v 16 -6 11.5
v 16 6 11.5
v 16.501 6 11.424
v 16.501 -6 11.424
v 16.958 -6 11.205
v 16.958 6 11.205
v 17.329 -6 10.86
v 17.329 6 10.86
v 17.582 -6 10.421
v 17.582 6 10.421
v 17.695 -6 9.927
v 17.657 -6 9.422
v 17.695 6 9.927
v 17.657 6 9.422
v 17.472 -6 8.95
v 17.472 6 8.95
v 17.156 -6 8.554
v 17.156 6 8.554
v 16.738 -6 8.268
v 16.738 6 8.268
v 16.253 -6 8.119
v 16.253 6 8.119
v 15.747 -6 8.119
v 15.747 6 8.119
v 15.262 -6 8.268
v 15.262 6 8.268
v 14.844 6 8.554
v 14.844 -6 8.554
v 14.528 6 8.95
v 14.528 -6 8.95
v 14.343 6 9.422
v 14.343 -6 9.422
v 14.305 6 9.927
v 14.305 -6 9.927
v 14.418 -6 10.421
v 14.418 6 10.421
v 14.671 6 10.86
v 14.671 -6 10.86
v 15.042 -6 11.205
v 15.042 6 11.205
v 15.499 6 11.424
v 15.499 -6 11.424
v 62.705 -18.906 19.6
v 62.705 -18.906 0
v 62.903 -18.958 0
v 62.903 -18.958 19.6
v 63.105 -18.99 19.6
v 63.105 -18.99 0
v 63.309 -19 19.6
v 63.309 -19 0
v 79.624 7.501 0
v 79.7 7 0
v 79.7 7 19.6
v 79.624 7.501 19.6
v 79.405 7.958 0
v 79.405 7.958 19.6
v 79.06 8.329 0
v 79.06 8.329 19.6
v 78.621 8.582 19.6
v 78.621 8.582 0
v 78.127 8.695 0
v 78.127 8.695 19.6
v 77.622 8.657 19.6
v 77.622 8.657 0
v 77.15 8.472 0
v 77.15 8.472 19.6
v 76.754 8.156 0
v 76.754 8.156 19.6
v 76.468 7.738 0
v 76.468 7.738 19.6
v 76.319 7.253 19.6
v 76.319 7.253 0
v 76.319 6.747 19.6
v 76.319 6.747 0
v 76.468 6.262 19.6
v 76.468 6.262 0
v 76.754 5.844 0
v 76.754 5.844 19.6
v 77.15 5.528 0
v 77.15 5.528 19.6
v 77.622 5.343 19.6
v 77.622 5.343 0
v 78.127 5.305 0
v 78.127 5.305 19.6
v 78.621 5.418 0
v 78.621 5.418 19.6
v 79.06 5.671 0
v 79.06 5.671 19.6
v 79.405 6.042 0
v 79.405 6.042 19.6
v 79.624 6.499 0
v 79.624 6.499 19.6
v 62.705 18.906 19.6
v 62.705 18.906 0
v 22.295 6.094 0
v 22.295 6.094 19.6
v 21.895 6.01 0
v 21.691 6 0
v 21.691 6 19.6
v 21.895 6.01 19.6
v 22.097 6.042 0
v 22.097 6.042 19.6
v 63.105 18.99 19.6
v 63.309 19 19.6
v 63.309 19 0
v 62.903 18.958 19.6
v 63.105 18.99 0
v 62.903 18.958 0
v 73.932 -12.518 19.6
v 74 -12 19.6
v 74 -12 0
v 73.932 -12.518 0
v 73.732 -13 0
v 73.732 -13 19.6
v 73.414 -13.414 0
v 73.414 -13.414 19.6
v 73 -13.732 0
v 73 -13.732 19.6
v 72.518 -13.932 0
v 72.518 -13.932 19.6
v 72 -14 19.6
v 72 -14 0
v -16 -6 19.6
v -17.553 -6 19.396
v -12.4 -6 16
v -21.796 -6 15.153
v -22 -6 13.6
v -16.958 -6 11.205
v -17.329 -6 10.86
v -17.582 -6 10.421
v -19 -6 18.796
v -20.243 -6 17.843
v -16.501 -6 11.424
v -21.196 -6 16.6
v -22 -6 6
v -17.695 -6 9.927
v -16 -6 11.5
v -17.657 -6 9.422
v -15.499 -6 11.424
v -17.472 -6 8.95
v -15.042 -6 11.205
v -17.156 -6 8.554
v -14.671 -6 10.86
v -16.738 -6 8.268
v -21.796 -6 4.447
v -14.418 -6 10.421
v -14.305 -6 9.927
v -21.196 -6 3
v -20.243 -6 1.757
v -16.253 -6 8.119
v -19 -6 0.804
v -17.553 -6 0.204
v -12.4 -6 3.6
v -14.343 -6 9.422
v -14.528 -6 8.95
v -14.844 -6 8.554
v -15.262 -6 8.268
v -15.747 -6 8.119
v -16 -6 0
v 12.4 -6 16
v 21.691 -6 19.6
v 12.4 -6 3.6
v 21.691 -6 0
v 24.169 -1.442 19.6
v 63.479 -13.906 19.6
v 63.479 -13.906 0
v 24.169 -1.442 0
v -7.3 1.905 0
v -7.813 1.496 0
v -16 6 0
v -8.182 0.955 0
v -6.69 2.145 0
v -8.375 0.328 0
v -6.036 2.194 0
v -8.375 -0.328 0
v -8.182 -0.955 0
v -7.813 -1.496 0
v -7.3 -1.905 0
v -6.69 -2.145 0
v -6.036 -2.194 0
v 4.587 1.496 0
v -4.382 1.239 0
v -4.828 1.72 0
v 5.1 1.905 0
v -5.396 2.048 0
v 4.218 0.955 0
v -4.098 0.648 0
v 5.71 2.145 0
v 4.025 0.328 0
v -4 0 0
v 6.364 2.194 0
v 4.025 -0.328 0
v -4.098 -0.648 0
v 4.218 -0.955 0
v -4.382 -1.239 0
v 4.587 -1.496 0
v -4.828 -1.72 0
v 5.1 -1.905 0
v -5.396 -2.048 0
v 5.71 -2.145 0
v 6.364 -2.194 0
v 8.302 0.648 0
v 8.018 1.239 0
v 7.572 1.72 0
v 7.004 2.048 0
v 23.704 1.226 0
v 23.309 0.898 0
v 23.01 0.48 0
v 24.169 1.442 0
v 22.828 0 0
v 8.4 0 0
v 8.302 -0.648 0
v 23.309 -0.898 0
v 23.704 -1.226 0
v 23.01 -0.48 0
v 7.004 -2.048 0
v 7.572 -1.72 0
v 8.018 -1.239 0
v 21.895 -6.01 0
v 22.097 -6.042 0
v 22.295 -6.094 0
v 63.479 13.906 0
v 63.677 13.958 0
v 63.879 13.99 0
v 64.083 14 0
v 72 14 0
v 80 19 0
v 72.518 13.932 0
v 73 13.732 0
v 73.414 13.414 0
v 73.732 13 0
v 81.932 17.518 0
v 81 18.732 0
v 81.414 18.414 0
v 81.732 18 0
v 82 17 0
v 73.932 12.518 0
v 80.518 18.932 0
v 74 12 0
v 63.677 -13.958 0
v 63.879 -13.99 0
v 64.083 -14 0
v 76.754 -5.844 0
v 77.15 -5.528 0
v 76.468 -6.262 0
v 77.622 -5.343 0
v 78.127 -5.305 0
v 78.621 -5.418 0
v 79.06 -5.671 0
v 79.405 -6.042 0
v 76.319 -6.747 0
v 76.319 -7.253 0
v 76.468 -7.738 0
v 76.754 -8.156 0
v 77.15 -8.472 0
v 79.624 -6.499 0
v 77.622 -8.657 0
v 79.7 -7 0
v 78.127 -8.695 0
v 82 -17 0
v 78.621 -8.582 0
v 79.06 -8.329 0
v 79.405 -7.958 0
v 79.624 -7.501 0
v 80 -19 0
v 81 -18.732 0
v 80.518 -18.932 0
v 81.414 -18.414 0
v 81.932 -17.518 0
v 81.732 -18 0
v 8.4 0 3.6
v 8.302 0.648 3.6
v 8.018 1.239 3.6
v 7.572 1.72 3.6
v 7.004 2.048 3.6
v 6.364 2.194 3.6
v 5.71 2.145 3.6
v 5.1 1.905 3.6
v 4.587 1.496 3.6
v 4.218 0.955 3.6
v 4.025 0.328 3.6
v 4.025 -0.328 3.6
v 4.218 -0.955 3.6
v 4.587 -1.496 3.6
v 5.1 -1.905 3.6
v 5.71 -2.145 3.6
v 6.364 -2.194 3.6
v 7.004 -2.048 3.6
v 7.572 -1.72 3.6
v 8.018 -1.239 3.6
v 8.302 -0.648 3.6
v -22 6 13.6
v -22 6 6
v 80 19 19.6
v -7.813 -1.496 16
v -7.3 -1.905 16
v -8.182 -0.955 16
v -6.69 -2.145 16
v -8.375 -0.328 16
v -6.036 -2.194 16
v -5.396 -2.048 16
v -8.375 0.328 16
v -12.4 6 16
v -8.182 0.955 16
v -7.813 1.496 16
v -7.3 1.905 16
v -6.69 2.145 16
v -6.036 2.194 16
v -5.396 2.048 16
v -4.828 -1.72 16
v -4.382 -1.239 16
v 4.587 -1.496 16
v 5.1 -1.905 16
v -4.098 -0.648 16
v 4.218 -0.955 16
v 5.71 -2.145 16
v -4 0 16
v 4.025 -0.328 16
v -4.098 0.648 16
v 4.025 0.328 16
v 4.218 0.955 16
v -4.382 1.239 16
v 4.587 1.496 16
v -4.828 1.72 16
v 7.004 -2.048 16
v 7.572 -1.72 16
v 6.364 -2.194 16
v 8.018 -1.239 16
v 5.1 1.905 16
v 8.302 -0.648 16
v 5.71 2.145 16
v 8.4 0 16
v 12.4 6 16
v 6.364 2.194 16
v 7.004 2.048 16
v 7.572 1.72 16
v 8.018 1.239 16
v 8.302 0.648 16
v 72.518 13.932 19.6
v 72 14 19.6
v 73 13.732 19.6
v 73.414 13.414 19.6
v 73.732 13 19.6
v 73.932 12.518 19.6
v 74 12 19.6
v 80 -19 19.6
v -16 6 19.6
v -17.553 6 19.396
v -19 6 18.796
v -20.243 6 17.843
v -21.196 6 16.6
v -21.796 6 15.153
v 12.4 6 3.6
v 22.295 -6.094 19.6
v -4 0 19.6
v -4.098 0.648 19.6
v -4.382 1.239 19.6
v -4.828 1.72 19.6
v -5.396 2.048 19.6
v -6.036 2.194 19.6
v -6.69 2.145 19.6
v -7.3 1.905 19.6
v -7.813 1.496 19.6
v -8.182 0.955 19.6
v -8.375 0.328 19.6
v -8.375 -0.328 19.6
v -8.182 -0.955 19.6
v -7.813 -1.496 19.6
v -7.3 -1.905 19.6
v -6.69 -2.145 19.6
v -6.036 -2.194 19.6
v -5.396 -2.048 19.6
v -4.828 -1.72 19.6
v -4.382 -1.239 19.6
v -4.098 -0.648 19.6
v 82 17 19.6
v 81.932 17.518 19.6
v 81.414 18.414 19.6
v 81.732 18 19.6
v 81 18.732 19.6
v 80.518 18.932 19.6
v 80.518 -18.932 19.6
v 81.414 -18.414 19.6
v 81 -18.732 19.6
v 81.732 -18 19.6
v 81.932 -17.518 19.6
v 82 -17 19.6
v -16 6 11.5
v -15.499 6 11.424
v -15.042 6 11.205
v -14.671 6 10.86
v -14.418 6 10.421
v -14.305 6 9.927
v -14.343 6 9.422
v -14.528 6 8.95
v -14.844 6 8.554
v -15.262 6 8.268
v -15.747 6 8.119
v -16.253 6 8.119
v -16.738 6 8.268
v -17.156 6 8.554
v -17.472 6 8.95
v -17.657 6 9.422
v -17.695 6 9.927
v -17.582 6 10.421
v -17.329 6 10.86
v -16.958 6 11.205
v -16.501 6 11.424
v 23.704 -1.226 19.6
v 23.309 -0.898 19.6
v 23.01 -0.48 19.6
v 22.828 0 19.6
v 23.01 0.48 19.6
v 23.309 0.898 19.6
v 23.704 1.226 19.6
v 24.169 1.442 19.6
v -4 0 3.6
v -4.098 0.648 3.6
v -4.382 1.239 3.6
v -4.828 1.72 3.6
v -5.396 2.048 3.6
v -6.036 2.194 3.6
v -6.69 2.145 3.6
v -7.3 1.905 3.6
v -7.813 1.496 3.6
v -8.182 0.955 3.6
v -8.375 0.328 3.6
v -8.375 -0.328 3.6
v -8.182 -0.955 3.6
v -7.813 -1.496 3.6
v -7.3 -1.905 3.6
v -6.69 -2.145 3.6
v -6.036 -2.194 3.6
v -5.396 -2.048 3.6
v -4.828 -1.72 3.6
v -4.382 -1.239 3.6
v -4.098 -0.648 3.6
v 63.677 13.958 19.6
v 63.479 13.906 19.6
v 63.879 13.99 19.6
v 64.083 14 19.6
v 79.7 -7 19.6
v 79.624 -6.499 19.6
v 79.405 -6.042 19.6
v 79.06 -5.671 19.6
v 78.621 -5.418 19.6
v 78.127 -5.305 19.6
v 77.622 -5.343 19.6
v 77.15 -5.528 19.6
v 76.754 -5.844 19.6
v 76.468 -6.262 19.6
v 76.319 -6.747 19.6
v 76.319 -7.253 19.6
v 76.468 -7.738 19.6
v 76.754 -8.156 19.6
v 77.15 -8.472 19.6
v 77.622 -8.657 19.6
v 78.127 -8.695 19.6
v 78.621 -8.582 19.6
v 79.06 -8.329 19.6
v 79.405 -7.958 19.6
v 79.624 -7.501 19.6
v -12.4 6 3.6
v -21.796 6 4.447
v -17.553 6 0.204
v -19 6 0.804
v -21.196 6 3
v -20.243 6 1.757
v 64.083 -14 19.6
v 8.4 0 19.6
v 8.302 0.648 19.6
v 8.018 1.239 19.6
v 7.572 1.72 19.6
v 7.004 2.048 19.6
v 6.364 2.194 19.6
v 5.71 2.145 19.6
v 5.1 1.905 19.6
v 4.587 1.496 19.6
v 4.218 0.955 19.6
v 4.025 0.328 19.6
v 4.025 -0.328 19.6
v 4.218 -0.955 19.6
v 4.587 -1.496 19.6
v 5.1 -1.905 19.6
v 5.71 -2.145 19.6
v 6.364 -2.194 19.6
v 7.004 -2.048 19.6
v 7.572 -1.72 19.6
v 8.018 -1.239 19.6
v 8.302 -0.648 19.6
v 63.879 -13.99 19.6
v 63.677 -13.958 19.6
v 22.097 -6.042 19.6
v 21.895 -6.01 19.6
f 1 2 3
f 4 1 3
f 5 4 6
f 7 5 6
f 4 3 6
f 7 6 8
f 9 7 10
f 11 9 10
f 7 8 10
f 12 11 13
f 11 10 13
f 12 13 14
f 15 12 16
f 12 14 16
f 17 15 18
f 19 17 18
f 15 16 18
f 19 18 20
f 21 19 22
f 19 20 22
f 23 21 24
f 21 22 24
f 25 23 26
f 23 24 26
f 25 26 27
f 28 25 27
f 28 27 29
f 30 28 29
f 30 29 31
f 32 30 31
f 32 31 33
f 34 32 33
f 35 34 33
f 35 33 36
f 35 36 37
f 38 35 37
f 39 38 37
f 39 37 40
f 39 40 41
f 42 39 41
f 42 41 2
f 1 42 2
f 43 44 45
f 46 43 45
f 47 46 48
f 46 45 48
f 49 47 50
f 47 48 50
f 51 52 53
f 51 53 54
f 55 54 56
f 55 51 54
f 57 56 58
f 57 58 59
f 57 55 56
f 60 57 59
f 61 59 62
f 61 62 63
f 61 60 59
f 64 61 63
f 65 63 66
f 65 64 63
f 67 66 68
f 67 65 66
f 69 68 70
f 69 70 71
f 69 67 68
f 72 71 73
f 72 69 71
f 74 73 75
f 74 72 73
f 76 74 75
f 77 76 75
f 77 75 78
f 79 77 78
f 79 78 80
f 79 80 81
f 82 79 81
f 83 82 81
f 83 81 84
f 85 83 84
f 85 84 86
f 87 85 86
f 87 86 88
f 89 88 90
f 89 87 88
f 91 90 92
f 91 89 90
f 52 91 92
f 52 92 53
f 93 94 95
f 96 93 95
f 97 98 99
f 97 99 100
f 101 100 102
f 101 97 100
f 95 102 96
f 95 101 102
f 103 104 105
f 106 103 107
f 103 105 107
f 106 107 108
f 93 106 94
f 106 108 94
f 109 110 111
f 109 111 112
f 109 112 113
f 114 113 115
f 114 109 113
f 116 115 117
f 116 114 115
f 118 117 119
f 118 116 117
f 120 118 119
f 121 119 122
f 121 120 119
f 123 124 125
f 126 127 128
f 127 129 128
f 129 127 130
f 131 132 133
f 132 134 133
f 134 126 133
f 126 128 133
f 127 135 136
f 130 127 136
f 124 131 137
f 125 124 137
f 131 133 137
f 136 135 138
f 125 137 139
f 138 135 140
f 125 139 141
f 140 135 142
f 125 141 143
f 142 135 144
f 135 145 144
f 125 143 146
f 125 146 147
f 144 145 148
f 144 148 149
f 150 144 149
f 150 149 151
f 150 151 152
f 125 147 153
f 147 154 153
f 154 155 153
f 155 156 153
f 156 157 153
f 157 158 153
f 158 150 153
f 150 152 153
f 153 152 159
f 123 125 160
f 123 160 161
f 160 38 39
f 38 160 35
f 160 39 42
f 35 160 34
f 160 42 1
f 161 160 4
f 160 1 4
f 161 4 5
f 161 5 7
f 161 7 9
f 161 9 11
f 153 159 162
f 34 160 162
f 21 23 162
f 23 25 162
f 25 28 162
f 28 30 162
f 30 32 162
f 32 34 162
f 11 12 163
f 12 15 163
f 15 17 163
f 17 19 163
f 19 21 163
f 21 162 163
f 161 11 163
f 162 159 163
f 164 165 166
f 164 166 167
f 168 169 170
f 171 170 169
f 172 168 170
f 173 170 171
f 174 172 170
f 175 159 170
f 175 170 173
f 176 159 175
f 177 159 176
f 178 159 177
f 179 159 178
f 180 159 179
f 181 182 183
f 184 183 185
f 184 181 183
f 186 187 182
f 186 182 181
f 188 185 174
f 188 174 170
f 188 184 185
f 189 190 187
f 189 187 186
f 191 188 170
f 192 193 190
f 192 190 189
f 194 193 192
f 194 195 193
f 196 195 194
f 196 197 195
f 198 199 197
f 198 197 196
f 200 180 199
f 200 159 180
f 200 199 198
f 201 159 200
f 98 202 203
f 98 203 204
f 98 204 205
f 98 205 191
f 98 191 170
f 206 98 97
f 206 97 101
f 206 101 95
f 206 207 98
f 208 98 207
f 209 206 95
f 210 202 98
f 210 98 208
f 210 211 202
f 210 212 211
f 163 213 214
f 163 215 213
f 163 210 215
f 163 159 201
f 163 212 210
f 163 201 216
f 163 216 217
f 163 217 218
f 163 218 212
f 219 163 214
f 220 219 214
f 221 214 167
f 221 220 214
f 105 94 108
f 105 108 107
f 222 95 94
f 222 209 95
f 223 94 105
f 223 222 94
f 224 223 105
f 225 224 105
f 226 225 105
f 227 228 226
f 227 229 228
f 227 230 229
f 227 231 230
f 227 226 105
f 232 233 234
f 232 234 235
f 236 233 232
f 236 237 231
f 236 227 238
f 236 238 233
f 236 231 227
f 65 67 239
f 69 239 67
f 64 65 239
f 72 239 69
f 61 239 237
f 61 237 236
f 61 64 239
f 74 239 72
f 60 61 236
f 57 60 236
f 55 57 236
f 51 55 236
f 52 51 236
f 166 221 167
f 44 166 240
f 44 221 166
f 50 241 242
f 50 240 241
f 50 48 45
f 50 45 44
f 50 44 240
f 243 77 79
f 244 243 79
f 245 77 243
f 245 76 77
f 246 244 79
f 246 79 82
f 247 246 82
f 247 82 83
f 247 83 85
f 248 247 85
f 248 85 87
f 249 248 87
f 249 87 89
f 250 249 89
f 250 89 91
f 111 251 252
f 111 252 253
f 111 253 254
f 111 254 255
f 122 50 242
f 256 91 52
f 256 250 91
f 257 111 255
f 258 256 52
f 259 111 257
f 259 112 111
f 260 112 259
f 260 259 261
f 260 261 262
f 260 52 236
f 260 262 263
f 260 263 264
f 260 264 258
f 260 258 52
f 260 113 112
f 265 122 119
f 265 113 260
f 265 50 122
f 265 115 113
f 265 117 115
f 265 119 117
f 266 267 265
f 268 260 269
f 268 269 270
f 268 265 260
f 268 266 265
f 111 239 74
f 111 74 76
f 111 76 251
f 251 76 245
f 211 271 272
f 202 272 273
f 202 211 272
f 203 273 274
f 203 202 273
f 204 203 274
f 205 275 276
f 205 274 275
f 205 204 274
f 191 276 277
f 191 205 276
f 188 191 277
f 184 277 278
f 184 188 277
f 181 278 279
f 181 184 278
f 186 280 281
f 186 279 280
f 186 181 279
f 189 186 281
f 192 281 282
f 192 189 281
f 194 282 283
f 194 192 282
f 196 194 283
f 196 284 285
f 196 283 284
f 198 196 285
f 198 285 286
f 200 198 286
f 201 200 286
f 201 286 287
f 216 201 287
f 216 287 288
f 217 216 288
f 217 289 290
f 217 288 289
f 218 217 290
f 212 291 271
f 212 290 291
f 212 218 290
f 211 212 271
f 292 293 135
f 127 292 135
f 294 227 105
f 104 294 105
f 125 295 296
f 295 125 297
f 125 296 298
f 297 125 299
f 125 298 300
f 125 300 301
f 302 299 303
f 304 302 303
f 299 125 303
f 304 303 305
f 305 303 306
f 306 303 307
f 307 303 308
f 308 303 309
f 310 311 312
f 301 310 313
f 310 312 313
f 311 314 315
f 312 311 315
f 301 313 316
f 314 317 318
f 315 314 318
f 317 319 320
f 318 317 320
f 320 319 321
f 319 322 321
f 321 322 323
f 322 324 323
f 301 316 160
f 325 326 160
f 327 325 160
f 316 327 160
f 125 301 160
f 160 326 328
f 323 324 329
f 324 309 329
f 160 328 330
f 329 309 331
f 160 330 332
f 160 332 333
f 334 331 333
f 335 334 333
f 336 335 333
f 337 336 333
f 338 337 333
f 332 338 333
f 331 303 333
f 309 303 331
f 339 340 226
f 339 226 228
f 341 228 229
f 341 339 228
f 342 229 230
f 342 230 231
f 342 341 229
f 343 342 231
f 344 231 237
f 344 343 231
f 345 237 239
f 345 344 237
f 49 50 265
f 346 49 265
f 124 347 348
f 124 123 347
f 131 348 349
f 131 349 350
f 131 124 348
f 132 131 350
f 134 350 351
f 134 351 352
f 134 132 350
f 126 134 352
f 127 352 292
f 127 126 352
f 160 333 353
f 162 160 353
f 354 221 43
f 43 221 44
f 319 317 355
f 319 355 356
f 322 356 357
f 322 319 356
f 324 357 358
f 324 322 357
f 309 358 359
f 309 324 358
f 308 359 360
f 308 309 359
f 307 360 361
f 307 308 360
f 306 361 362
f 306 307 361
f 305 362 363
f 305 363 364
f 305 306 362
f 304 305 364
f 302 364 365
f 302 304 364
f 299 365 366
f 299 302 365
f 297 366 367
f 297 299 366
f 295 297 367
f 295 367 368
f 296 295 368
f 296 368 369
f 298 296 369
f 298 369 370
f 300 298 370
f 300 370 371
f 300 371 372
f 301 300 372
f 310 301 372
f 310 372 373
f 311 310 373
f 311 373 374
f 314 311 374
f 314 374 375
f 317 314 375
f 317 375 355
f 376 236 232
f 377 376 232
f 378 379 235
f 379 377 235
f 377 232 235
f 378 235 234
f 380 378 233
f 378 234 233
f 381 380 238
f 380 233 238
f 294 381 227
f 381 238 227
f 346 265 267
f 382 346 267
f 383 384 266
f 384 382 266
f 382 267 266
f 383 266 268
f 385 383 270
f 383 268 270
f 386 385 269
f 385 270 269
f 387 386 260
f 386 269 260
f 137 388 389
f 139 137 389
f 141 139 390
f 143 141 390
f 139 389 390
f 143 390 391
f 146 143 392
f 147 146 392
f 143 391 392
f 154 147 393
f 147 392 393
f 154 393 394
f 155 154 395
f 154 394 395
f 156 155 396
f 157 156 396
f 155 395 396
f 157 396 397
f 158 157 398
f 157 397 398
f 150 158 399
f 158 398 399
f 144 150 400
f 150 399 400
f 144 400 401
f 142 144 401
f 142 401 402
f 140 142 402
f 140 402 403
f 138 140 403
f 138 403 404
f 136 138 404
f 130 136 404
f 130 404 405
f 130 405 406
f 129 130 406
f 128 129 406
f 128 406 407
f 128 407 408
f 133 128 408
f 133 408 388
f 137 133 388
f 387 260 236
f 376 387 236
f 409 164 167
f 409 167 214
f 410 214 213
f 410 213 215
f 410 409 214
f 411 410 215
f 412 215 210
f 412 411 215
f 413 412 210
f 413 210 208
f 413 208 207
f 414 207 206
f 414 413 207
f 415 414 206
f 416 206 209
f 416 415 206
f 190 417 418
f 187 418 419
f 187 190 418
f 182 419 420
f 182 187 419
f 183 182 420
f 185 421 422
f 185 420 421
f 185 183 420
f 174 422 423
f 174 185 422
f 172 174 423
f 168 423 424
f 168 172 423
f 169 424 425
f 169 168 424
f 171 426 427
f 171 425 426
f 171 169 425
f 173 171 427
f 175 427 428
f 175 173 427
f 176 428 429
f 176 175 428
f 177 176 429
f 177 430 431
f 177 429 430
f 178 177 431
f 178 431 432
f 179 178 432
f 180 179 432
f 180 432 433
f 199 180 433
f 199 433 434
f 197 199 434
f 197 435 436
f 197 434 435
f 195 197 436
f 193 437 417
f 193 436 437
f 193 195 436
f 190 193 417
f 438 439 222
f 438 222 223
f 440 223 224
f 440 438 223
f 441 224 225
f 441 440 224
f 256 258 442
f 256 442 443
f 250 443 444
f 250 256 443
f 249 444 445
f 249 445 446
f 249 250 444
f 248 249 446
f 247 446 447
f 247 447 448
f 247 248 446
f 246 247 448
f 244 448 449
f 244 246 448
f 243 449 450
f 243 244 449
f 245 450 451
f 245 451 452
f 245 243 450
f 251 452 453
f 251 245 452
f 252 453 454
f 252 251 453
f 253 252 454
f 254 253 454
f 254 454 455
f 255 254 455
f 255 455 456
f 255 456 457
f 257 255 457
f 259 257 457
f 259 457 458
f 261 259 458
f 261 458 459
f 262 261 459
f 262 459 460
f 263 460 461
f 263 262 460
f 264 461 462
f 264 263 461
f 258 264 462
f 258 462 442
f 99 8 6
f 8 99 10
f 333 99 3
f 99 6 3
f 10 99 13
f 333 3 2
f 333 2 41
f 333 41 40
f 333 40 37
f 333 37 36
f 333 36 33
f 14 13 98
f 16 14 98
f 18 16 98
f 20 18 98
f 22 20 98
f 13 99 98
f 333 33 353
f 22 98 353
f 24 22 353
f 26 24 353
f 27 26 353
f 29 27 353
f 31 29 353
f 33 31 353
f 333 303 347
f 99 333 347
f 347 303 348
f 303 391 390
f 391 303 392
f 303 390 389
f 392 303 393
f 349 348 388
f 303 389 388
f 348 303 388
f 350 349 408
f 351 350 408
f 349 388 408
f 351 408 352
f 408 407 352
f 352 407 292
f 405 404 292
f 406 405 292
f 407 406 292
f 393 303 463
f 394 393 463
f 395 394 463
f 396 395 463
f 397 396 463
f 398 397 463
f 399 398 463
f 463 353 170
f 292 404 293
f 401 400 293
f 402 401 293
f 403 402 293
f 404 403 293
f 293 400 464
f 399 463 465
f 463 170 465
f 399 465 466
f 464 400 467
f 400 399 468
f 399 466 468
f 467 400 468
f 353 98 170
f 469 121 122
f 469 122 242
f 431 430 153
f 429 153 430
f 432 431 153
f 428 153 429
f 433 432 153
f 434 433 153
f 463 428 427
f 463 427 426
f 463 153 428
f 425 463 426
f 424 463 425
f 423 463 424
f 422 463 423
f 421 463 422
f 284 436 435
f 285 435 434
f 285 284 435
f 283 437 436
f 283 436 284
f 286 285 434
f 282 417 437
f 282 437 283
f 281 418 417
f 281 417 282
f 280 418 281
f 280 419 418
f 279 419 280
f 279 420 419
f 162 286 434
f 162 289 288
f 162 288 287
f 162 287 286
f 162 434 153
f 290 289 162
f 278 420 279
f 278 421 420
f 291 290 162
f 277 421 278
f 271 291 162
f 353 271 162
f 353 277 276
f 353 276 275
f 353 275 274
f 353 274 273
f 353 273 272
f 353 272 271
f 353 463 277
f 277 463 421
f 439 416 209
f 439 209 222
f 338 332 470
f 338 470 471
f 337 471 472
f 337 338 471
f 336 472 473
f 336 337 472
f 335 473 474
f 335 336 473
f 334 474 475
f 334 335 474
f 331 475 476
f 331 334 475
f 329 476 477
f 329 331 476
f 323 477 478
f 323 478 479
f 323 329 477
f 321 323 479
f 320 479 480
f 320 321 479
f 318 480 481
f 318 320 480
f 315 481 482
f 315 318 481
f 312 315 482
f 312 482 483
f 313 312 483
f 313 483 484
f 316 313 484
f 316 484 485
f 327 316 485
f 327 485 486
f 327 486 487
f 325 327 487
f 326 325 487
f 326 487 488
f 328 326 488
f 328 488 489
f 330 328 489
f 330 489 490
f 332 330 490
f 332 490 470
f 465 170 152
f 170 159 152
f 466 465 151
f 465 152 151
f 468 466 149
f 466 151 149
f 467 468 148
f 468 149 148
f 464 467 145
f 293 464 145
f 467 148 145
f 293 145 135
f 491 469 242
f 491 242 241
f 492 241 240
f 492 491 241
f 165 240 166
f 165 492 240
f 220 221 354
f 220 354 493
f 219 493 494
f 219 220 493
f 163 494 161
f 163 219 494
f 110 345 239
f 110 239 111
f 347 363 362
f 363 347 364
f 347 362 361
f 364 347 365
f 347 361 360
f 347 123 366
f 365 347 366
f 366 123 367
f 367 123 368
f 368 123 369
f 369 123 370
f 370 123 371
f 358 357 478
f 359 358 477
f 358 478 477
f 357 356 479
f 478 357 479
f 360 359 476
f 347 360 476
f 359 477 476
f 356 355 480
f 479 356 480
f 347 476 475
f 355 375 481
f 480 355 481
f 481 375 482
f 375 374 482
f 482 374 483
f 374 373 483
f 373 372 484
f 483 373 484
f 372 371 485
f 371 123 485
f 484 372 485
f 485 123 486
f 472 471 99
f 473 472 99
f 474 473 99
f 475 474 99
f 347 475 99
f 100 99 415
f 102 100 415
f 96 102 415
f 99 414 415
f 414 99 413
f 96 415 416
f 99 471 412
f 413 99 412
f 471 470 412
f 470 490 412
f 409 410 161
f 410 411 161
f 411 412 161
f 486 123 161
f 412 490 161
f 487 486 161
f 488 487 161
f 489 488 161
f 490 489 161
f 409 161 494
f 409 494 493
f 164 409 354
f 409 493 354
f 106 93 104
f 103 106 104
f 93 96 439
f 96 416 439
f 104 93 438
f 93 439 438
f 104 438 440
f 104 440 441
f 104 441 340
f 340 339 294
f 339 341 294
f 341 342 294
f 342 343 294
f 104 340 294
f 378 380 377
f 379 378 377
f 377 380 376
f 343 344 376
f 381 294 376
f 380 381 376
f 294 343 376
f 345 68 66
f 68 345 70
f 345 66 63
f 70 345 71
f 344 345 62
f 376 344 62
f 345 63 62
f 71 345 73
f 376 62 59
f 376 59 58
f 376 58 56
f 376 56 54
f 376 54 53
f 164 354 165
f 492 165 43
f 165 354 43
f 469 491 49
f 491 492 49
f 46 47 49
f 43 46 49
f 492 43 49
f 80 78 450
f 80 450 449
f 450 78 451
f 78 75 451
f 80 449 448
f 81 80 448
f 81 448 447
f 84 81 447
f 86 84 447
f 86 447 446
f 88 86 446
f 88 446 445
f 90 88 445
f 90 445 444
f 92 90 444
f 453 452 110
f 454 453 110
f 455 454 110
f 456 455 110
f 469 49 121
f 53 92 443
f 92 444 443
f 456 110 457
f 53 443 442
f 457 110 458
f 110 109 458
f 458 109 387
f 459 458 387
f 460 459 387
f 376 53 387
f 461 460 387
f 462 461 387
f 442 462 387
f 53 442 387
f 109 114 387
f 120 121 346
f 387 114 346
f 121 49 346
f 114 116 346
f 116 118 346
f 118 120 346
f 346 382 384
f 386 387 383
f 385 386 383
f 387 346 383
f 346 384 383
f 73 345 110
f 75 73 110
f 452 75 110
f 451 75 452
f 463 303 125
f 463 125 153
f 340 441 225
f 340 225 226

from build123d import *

# Parameters (mm, degrees)
SKETCH_1_R          = 2.2
SKETCH_1_R_2        = 1.7
EXTRUDE_1_DEPTH     = 19.6
SKETCH_2_R          = 1.7
SKETCH_2_W          = 24.8
SKETCH_2_H          = 12.4
CUT_EXTRUDE_1_DEPTH = 88.938387522
CUT_EXTRUDE_2_DEPTH = 87.424302138
FILLET_1_R          = 2
FILLET_2_R          = 6


with BuildPart() as part:
    # 草图1 → 凸台-拉伸1 (new body)
    with BuildSketch(Plane.XY):
        Polygon((-22, -6), (22, -6), (63, -19), (82, -19), (82, 19), (63, 19), (22, 6), (-22, 6), align=None)
        with Locations((-6.2, 0)):
            Circle(SKETCH_1_R, mode=Mode.SUBTRACT)
        with Locations((6.2, 0)):
            Circle(SKETCH_1_R, mode=Mode.SUBTRACT)
        with Locations((78, 7)):
            Circle(SKETCH_1_R_2, mode=Mode.SUBTRACT)
        with Locations((78, -7)):
            Circle(SKETCH_1_R_2, mode=Mode.SUBTRACT)
    extrude(amount=EXTRUDE_1_DEPTH)

    # 草图2 → 切除-拉伸1 (cut, through all)
    with BuildSketch(Plane(origin=(0, 6, 0), x_dir=(1, 0, 0), z_dir=(0, 1, 0))):
        with Locations(Location((16, -9.8, 0), (0, 0, 270))):
            Circle(SKETCH_2_R)
        with Locations(Location((-16, -9.8, 0), (0, 0, 270))):
            Circle(SKETCH_2_R)
        with Locations((0, -9.8)):
            Rectangle(SKETCH_2_W, SKETCH_2_H)
    extrude(amount=-CUT_EXTRUDE_1_DEPTH, mode=Mode.SUBTRACT)

    # 草图3 → 切除-拉伸2 (cut, through all)
    with BuildSketch(Plane.XY.offset(19.6)):
        Polygon((74, 14), (74, -14), (63.773702437, -14), (22.773702437, -1), (22.773702437, 1), (63.773702437, 14), align=None)
    extrude(amount=-CUT_EXTRUDE_2_DEPTH, mode=Mode.SUBTRACT)

    # 圆角1
    # the kernel refuses this fillet: 2 mm, written as the material it adds along each edge
    with BuildSketch(Plane(origin=(74, 14, 19.6), x_dir=(-1, 0, 0), z_dir=(0, 0, -1))) as fillet_1_piece_1:
        with BuildLine():
            CenterArc((FILLET_1_R, -FILLET_1_R), FILLET_1_R, 90, 90)
            Line((0, -FILLET_1_R), (0, 0))
            Line((0, 0), (FILLET_1_R, 0))
        make_face()
    extrude(amount=19.6)
    with BuildSketch(Plane(origin=(63.773702437, 14, 19.6), x_dir=(1, 0, 0), z_dir=(0, 0, -1)), Plane(origin=(63.773702437, -14, 19.6), x_dir=(-0.9532306376993169, 0.30224386073393383, 0), z_dir=(0, 0, -1)), Plane(origin=(22, -6, 0), x_dir=(-1, 0, 0), z_dir=(0, 0, 1))) as fillet_1_piece_2:
        with BuildLine():
            CenterArc((FILLET_1_R * 0.154740487324, FILLET_1_R), FILLET_1_R, 252.407575438, 17.592424562)
            Line((-FILLET_1_R * 0.14750337341, FILLET_1_R * 0.0467693623007), (0, 0))
            Line((0, 0), (FILLET_1_R * 0.154740487324, 0))
        make_face()
    extrude(amount=19.6)
    with BuildSketch(Plane(origin=(74, -14, 19.6), x_dir=(-1, 0, 0), z_dir=(0, 0, -1))) as fillet_1_piece_3:
        with BuildLine():
            CenterArc((FILLET_1_R, FILLET_1_R), FILLET_1_R, 180, 90)
            Line((0, FILLET_1_R), (0, 0))
            Line((0, 0), (FILLET_1_R, 0))
        make_face()
    extrude(amount=19.6)
    with BuildSketch(Plane(origin=(22.773702437, 1, 19.6), x_dir=(0.9532306376993182, 0.30224386073392995, 0), z_dir=(0, 0, -1)), Plane(origin=(22.773702437, -1, 19.6), x_dir=(0, 1, 0), z_dir=(0, 0, -1))) as fillet_1_piece_4:
        with BuildLine():
            CenterArc((FILLET_1_R * 0.731990886225, FILLET_1_R), FILLET_1_R, 197.592424562, 72.407575438)
            Line((-FILLET_1_R * 0.221239751475, FILLET_1_R * 0.697756139266), (0, 0))
            Line((0, 0), (FILLET_1_R * 0.731990886225, 0))
        make_face()
    extrude(amount=19.6)
    with BuildSketch(Plane(origin=(22, 6, 0), x_dir=(-1, 0, 0), z_dir=(0, 0, 1))) as fillet_1_piece_5:
        with BuildLine():
            CenterArc((FILLET_1_R * 0.154740487324, -FILLET_1_R), FILLET_1_R, 90, 17.592424562)
            Line((-FILLET_1_R * 0.14750337341, -FILLET_1_R * 0.0467693623007), (0, 0))
            Line((0, 0), (FILLET_1_R * 0.154740487324, 0))
        make_face()
    extrude(amount=19.6)
    # the kernel refuses this fillet: 2 mm, written as the material it takes off along each edge
    with BuildSketch(Plane(origin=(82, -19, -5), x_dir=(-1, 0, 0), z_dir=(0, 0, 1)), Plane(origin=(82, 19, -5), x_dir=(0, -1, 0), z_dir=(0, 0, 1))) as fillet_1_2_piece_1:
        with BuildLine():
            CenterArc((FILLET_1_R, -FILLET_1_R), FILLET_1_R, 90, 90)
            Line((0, -FILLET_1_R), (0, 0))
            Line((0, 0), (FILLET_1_R, 0))
        make_face()
    extrude(amount=29.6, mode=Mode.SUBTRACT)
    with BuildSketch(Plane(origin=(63, -19, -0.773702437), x_dir=(-0.9532306376993186, 0.3022438607339286, 0), z_dir=(0, 0, 1))) as fillet_1_2_piece_2:
        with BuildLine():
            CenterArc((FILLET_1_R * 0.154740487324, -FILLET_1_R), FILLET_1_R, 90, 17.592424562)
            Line((-FILLET_1_R * 0.14750337341, -FILLET_1_R * 0.0467693623007), (0, 0))
            Line((0, 0), (FILLET_1_R * 0.154740487324, 0))
        make_face()
    extrude(amount=21.147404873, mode=Mode.SUBTRACT)
    with BuildSketch(Plane(origin=(63, 19, -0.773702437), x_dir=(-0.9532306376993186, -0.3022438607339286, 0), z_dir=(0, 0, 1))) as fillet_1_2_piece_3:
        with BuildLine():
            CenterArc((FILLET_1_R * 0.154740487324, FILLET_1_R), FILLET_1_R, 252.407575438, 17.592424562)
            Line((-FILLET_1_R * 0.14750337341, FILLET_1_R * 0.0467693623007), (0, 0))
            Line((0, 0), (FILLET_1_R * 0.154740487324, 0))
        make_face()
    extrude(amount=21.147404873, mode=Mode.SUBTRACT)

    # 圆角2
    fillet_2_edges = [part.edges().sort_by_distance(p)[0] for p in [
        (-22, 0, 0),
        (-22, 0, 19.6),
    ]]
    fillet(fillet_2_edges, radius=FILLET_2_R)


solid = part.part
